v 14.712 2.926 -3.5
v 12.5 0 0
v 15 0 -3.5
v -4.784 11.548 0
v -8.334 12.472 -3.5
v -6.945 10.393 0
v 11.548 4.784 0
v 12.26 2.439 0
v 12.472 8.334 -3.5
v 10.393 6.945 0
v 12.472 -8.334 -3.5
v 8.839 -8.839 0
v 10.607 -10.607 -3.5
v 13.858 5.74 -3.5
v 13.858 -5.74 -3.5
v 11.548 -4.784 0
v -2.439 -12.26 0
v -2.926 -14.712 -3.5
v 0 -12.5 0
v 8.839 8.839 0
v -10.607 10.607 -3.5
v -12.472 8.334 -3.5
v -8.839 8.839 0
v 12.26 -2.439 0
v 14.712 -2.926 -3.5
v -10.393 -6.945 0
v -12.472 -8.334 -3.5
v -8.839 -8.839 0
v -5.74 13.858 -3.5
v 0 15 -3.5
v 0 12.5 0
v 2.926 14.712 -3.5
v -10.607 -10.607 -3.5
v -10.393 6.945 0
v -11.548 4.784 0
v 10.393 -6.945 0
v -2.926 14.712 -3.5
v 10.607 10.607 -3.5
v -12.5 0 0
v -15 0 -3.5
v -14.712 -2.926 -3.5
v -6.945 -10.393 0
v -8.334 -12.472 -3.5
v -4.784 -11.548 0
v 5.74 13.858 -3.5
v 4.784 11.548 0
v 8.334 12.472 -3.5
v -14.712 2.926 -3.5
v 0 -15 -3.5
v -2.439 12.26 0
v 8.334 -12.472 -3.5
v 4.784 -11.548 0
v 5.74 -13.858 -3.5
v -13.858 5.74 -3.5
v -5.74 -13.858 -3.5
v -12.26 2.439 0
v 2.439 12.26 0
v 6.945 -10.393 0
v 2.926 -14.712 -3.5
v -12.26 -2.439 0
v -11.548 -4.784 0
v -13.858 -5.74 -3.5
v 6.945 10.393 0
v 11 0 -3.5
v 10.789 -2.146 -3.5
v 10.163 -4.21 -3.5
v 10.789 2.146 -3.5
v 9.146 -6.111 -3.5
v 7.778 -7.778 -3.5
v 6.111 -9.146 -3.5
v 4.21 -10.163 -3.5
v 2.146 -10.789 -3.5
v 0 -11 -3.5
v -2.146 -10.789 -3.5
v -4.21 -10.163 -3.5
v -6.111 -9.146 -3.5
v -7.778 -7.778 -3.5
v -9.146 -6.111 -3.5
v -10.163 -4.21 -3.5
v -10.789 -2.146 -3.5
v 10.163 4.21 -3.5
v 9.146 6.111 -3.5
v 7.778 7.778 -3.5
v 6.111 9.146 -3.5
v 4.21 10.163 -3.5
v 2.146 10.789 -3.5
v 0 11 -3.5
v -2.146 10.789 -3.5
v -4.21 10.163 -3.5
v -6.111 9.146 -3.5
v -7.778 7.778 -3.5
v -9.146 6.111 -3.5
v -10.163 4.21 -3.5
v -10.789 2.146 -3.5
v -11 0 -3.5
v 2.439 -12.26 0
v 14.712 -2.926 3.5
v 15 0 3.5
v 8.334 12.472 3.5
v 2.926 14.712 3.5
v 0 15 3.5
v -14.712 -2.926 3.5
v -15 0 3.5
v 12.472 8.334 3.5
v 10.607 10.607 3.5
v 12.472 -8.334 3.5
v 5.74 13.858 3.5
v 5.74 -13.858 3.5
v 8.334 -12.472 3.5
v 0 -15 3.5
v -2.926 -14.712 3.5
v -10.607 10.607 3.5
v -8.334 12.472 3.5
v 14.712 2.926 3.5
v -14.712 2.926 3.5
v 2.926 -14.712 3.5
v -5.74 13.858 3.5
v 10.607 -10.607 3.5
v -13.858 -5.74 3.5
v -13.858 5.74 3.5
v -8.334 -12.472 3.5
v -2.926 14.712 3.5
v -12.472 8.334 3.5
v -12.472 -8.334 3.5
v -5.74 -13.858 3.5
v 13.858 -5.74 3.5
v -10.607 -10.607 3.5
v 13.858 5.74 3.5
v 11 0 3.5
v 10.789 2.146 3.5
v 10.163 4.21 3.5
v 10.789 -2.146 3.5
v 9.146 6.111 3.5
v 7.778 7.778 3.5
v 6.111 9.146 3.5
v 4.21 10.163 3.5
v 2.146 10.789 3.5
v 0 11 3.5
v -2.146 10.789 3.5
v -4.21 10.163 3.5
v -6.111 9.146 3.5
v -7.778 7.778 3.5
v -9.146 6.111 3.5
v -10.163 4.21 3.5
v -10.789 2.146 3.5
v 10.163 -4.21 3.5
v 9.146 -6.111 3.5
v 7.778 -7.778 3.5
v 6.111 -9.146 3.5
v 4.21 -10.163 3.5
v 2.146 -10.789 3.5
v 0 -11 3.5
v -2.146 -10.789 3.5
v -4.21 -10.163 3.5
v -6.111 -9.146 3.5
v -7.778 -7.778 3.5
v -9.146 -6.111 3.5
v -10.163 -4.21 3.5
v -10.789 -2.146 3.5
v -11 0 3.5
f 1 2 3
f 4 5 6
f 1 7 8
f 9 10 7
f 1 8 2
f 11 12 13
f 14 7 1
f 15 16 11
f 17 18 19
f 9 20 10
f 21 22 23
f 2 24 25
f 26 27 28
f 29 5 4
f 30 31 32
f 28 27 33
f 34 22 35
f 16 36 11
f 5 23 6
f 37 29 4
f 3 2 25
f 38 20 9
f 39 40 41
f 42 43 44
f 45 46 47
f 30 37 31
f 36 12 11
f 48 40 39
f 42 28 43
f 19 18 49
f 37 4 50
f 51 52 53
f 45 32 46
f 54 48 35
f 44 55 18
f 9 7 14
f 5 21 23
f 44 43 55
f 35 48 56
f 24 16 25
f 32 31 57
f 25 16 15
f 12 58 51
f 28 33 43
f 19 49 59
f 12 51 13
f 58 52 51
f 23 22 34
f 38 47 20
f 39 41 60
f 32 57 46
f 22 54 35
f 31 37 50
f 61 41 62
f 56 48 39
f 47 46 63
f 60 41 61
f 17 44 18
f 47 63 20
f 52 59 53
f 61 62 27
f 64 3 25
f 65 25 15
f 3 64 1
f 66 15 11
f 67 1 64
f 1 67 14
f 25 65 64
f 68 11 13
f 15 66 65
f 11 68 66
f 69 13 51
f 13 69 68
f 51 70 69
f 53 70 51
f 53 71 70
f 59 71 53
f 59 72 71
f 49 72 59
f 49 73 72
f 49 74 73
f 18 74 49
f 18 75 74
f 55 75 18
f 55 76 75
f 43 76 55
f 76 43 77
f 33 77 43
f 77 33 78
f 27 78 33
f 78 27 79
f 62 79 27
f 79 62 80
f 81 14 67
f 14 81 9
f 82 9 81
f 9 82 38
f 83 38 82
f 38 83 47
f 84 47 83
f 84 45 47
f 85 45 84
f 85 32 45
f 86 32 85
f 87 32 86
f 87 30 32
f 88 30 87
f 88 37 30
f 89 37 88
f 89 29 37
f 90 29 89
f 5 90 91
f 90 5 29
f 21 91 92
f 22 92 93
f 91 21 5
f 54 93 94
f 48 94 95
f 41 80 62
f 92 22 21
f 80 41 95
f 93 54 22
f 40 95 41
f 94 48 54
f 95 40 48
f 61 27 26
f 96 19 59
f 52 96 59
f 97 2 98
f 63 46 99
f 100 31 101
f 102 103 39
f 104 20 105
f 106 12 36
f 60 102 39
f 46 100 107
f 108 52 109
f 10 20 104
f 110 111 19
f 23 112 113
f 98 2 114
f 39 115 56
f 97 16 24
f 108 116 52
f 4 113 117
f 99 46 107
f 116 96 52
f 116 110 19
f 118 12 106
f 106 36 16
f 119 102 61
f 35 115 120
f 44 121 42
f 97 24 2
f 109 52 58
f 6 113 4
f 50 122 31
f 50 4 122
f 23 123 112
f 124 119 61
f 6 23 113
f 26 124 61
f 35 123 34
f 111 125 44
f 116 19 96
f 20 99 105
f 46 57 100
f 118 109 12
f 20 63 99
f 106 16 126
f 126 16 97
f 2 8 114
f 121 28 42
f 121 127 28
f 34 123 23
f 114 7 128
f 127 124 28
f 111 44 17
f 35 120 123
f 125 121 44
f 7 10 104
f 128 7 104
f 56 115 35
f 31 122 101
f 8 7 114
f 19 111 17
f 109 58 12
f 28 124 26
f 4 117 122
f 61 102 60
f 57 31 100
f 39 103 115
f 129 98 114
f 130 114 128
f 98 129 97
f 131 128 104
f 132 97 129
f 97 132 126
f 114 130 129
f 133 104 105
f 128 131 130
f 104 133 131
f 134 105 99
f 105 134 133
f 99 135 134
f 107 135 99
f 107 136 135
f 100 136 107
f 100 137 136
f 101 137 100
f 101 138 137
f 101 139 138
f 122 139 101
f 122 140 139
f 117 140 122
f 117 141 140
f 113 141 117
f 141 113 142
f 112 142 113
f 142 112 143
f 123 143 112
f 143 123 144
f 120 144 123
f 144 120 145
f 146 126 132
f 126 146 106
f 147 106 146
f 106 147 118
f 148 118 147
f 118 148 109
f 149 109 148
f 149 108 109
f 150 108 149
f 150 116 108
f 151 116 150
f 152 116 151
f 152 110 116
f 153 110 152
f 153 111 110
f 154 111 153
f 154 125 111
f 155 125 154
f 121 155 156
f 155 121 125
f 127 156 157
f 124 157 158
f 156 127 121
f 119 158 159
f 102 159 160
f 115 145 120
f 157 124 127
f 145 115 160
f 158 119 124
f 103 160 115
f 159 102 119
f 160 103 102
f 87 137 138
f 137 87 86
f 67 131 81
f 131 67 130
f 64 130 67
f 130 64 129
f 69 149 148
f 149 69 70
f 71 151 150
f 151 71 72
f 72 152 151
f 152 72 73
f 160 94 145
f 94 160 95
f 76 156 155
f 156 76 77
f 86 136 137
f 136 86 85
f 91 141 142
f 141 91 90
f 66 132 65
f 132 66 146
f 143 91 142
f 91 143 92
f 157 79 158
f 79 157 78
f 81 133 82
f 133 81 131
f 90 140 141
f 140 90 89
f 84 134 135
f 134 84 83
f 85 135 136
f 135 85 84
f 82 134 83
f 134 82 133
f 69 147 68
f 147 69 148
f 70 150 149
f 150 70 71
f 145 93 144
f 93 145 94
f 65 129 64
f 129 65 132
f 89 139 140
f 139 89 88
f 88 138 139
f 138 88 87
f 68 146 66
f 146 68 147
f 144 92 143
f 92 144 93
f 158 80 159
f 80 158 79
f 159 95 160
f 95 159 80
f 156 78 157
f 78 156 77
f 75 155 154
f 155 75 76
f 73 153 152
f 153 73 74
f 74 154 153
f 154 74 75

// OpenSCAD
$fn = 32;

// 608
bearing_width = 7;
bearing_dia = 22;
outer_dia = 30;
inner_dia = 25;

module half() {
	cylinder(d1 = outer_dia, d2 = inner_dia,
		h = bearing_width/2,
		center = true);
}

difference() {
	union() {
		translate([0, 0, -bearing_width/4])
			half();
		translate([0, 0, bearing_width/4])
			rotate([180, 0, 0])
				half();
	}

	cylinder(d = bearing_dia, h = 2.1*bearing_width,
		center = true);
}
